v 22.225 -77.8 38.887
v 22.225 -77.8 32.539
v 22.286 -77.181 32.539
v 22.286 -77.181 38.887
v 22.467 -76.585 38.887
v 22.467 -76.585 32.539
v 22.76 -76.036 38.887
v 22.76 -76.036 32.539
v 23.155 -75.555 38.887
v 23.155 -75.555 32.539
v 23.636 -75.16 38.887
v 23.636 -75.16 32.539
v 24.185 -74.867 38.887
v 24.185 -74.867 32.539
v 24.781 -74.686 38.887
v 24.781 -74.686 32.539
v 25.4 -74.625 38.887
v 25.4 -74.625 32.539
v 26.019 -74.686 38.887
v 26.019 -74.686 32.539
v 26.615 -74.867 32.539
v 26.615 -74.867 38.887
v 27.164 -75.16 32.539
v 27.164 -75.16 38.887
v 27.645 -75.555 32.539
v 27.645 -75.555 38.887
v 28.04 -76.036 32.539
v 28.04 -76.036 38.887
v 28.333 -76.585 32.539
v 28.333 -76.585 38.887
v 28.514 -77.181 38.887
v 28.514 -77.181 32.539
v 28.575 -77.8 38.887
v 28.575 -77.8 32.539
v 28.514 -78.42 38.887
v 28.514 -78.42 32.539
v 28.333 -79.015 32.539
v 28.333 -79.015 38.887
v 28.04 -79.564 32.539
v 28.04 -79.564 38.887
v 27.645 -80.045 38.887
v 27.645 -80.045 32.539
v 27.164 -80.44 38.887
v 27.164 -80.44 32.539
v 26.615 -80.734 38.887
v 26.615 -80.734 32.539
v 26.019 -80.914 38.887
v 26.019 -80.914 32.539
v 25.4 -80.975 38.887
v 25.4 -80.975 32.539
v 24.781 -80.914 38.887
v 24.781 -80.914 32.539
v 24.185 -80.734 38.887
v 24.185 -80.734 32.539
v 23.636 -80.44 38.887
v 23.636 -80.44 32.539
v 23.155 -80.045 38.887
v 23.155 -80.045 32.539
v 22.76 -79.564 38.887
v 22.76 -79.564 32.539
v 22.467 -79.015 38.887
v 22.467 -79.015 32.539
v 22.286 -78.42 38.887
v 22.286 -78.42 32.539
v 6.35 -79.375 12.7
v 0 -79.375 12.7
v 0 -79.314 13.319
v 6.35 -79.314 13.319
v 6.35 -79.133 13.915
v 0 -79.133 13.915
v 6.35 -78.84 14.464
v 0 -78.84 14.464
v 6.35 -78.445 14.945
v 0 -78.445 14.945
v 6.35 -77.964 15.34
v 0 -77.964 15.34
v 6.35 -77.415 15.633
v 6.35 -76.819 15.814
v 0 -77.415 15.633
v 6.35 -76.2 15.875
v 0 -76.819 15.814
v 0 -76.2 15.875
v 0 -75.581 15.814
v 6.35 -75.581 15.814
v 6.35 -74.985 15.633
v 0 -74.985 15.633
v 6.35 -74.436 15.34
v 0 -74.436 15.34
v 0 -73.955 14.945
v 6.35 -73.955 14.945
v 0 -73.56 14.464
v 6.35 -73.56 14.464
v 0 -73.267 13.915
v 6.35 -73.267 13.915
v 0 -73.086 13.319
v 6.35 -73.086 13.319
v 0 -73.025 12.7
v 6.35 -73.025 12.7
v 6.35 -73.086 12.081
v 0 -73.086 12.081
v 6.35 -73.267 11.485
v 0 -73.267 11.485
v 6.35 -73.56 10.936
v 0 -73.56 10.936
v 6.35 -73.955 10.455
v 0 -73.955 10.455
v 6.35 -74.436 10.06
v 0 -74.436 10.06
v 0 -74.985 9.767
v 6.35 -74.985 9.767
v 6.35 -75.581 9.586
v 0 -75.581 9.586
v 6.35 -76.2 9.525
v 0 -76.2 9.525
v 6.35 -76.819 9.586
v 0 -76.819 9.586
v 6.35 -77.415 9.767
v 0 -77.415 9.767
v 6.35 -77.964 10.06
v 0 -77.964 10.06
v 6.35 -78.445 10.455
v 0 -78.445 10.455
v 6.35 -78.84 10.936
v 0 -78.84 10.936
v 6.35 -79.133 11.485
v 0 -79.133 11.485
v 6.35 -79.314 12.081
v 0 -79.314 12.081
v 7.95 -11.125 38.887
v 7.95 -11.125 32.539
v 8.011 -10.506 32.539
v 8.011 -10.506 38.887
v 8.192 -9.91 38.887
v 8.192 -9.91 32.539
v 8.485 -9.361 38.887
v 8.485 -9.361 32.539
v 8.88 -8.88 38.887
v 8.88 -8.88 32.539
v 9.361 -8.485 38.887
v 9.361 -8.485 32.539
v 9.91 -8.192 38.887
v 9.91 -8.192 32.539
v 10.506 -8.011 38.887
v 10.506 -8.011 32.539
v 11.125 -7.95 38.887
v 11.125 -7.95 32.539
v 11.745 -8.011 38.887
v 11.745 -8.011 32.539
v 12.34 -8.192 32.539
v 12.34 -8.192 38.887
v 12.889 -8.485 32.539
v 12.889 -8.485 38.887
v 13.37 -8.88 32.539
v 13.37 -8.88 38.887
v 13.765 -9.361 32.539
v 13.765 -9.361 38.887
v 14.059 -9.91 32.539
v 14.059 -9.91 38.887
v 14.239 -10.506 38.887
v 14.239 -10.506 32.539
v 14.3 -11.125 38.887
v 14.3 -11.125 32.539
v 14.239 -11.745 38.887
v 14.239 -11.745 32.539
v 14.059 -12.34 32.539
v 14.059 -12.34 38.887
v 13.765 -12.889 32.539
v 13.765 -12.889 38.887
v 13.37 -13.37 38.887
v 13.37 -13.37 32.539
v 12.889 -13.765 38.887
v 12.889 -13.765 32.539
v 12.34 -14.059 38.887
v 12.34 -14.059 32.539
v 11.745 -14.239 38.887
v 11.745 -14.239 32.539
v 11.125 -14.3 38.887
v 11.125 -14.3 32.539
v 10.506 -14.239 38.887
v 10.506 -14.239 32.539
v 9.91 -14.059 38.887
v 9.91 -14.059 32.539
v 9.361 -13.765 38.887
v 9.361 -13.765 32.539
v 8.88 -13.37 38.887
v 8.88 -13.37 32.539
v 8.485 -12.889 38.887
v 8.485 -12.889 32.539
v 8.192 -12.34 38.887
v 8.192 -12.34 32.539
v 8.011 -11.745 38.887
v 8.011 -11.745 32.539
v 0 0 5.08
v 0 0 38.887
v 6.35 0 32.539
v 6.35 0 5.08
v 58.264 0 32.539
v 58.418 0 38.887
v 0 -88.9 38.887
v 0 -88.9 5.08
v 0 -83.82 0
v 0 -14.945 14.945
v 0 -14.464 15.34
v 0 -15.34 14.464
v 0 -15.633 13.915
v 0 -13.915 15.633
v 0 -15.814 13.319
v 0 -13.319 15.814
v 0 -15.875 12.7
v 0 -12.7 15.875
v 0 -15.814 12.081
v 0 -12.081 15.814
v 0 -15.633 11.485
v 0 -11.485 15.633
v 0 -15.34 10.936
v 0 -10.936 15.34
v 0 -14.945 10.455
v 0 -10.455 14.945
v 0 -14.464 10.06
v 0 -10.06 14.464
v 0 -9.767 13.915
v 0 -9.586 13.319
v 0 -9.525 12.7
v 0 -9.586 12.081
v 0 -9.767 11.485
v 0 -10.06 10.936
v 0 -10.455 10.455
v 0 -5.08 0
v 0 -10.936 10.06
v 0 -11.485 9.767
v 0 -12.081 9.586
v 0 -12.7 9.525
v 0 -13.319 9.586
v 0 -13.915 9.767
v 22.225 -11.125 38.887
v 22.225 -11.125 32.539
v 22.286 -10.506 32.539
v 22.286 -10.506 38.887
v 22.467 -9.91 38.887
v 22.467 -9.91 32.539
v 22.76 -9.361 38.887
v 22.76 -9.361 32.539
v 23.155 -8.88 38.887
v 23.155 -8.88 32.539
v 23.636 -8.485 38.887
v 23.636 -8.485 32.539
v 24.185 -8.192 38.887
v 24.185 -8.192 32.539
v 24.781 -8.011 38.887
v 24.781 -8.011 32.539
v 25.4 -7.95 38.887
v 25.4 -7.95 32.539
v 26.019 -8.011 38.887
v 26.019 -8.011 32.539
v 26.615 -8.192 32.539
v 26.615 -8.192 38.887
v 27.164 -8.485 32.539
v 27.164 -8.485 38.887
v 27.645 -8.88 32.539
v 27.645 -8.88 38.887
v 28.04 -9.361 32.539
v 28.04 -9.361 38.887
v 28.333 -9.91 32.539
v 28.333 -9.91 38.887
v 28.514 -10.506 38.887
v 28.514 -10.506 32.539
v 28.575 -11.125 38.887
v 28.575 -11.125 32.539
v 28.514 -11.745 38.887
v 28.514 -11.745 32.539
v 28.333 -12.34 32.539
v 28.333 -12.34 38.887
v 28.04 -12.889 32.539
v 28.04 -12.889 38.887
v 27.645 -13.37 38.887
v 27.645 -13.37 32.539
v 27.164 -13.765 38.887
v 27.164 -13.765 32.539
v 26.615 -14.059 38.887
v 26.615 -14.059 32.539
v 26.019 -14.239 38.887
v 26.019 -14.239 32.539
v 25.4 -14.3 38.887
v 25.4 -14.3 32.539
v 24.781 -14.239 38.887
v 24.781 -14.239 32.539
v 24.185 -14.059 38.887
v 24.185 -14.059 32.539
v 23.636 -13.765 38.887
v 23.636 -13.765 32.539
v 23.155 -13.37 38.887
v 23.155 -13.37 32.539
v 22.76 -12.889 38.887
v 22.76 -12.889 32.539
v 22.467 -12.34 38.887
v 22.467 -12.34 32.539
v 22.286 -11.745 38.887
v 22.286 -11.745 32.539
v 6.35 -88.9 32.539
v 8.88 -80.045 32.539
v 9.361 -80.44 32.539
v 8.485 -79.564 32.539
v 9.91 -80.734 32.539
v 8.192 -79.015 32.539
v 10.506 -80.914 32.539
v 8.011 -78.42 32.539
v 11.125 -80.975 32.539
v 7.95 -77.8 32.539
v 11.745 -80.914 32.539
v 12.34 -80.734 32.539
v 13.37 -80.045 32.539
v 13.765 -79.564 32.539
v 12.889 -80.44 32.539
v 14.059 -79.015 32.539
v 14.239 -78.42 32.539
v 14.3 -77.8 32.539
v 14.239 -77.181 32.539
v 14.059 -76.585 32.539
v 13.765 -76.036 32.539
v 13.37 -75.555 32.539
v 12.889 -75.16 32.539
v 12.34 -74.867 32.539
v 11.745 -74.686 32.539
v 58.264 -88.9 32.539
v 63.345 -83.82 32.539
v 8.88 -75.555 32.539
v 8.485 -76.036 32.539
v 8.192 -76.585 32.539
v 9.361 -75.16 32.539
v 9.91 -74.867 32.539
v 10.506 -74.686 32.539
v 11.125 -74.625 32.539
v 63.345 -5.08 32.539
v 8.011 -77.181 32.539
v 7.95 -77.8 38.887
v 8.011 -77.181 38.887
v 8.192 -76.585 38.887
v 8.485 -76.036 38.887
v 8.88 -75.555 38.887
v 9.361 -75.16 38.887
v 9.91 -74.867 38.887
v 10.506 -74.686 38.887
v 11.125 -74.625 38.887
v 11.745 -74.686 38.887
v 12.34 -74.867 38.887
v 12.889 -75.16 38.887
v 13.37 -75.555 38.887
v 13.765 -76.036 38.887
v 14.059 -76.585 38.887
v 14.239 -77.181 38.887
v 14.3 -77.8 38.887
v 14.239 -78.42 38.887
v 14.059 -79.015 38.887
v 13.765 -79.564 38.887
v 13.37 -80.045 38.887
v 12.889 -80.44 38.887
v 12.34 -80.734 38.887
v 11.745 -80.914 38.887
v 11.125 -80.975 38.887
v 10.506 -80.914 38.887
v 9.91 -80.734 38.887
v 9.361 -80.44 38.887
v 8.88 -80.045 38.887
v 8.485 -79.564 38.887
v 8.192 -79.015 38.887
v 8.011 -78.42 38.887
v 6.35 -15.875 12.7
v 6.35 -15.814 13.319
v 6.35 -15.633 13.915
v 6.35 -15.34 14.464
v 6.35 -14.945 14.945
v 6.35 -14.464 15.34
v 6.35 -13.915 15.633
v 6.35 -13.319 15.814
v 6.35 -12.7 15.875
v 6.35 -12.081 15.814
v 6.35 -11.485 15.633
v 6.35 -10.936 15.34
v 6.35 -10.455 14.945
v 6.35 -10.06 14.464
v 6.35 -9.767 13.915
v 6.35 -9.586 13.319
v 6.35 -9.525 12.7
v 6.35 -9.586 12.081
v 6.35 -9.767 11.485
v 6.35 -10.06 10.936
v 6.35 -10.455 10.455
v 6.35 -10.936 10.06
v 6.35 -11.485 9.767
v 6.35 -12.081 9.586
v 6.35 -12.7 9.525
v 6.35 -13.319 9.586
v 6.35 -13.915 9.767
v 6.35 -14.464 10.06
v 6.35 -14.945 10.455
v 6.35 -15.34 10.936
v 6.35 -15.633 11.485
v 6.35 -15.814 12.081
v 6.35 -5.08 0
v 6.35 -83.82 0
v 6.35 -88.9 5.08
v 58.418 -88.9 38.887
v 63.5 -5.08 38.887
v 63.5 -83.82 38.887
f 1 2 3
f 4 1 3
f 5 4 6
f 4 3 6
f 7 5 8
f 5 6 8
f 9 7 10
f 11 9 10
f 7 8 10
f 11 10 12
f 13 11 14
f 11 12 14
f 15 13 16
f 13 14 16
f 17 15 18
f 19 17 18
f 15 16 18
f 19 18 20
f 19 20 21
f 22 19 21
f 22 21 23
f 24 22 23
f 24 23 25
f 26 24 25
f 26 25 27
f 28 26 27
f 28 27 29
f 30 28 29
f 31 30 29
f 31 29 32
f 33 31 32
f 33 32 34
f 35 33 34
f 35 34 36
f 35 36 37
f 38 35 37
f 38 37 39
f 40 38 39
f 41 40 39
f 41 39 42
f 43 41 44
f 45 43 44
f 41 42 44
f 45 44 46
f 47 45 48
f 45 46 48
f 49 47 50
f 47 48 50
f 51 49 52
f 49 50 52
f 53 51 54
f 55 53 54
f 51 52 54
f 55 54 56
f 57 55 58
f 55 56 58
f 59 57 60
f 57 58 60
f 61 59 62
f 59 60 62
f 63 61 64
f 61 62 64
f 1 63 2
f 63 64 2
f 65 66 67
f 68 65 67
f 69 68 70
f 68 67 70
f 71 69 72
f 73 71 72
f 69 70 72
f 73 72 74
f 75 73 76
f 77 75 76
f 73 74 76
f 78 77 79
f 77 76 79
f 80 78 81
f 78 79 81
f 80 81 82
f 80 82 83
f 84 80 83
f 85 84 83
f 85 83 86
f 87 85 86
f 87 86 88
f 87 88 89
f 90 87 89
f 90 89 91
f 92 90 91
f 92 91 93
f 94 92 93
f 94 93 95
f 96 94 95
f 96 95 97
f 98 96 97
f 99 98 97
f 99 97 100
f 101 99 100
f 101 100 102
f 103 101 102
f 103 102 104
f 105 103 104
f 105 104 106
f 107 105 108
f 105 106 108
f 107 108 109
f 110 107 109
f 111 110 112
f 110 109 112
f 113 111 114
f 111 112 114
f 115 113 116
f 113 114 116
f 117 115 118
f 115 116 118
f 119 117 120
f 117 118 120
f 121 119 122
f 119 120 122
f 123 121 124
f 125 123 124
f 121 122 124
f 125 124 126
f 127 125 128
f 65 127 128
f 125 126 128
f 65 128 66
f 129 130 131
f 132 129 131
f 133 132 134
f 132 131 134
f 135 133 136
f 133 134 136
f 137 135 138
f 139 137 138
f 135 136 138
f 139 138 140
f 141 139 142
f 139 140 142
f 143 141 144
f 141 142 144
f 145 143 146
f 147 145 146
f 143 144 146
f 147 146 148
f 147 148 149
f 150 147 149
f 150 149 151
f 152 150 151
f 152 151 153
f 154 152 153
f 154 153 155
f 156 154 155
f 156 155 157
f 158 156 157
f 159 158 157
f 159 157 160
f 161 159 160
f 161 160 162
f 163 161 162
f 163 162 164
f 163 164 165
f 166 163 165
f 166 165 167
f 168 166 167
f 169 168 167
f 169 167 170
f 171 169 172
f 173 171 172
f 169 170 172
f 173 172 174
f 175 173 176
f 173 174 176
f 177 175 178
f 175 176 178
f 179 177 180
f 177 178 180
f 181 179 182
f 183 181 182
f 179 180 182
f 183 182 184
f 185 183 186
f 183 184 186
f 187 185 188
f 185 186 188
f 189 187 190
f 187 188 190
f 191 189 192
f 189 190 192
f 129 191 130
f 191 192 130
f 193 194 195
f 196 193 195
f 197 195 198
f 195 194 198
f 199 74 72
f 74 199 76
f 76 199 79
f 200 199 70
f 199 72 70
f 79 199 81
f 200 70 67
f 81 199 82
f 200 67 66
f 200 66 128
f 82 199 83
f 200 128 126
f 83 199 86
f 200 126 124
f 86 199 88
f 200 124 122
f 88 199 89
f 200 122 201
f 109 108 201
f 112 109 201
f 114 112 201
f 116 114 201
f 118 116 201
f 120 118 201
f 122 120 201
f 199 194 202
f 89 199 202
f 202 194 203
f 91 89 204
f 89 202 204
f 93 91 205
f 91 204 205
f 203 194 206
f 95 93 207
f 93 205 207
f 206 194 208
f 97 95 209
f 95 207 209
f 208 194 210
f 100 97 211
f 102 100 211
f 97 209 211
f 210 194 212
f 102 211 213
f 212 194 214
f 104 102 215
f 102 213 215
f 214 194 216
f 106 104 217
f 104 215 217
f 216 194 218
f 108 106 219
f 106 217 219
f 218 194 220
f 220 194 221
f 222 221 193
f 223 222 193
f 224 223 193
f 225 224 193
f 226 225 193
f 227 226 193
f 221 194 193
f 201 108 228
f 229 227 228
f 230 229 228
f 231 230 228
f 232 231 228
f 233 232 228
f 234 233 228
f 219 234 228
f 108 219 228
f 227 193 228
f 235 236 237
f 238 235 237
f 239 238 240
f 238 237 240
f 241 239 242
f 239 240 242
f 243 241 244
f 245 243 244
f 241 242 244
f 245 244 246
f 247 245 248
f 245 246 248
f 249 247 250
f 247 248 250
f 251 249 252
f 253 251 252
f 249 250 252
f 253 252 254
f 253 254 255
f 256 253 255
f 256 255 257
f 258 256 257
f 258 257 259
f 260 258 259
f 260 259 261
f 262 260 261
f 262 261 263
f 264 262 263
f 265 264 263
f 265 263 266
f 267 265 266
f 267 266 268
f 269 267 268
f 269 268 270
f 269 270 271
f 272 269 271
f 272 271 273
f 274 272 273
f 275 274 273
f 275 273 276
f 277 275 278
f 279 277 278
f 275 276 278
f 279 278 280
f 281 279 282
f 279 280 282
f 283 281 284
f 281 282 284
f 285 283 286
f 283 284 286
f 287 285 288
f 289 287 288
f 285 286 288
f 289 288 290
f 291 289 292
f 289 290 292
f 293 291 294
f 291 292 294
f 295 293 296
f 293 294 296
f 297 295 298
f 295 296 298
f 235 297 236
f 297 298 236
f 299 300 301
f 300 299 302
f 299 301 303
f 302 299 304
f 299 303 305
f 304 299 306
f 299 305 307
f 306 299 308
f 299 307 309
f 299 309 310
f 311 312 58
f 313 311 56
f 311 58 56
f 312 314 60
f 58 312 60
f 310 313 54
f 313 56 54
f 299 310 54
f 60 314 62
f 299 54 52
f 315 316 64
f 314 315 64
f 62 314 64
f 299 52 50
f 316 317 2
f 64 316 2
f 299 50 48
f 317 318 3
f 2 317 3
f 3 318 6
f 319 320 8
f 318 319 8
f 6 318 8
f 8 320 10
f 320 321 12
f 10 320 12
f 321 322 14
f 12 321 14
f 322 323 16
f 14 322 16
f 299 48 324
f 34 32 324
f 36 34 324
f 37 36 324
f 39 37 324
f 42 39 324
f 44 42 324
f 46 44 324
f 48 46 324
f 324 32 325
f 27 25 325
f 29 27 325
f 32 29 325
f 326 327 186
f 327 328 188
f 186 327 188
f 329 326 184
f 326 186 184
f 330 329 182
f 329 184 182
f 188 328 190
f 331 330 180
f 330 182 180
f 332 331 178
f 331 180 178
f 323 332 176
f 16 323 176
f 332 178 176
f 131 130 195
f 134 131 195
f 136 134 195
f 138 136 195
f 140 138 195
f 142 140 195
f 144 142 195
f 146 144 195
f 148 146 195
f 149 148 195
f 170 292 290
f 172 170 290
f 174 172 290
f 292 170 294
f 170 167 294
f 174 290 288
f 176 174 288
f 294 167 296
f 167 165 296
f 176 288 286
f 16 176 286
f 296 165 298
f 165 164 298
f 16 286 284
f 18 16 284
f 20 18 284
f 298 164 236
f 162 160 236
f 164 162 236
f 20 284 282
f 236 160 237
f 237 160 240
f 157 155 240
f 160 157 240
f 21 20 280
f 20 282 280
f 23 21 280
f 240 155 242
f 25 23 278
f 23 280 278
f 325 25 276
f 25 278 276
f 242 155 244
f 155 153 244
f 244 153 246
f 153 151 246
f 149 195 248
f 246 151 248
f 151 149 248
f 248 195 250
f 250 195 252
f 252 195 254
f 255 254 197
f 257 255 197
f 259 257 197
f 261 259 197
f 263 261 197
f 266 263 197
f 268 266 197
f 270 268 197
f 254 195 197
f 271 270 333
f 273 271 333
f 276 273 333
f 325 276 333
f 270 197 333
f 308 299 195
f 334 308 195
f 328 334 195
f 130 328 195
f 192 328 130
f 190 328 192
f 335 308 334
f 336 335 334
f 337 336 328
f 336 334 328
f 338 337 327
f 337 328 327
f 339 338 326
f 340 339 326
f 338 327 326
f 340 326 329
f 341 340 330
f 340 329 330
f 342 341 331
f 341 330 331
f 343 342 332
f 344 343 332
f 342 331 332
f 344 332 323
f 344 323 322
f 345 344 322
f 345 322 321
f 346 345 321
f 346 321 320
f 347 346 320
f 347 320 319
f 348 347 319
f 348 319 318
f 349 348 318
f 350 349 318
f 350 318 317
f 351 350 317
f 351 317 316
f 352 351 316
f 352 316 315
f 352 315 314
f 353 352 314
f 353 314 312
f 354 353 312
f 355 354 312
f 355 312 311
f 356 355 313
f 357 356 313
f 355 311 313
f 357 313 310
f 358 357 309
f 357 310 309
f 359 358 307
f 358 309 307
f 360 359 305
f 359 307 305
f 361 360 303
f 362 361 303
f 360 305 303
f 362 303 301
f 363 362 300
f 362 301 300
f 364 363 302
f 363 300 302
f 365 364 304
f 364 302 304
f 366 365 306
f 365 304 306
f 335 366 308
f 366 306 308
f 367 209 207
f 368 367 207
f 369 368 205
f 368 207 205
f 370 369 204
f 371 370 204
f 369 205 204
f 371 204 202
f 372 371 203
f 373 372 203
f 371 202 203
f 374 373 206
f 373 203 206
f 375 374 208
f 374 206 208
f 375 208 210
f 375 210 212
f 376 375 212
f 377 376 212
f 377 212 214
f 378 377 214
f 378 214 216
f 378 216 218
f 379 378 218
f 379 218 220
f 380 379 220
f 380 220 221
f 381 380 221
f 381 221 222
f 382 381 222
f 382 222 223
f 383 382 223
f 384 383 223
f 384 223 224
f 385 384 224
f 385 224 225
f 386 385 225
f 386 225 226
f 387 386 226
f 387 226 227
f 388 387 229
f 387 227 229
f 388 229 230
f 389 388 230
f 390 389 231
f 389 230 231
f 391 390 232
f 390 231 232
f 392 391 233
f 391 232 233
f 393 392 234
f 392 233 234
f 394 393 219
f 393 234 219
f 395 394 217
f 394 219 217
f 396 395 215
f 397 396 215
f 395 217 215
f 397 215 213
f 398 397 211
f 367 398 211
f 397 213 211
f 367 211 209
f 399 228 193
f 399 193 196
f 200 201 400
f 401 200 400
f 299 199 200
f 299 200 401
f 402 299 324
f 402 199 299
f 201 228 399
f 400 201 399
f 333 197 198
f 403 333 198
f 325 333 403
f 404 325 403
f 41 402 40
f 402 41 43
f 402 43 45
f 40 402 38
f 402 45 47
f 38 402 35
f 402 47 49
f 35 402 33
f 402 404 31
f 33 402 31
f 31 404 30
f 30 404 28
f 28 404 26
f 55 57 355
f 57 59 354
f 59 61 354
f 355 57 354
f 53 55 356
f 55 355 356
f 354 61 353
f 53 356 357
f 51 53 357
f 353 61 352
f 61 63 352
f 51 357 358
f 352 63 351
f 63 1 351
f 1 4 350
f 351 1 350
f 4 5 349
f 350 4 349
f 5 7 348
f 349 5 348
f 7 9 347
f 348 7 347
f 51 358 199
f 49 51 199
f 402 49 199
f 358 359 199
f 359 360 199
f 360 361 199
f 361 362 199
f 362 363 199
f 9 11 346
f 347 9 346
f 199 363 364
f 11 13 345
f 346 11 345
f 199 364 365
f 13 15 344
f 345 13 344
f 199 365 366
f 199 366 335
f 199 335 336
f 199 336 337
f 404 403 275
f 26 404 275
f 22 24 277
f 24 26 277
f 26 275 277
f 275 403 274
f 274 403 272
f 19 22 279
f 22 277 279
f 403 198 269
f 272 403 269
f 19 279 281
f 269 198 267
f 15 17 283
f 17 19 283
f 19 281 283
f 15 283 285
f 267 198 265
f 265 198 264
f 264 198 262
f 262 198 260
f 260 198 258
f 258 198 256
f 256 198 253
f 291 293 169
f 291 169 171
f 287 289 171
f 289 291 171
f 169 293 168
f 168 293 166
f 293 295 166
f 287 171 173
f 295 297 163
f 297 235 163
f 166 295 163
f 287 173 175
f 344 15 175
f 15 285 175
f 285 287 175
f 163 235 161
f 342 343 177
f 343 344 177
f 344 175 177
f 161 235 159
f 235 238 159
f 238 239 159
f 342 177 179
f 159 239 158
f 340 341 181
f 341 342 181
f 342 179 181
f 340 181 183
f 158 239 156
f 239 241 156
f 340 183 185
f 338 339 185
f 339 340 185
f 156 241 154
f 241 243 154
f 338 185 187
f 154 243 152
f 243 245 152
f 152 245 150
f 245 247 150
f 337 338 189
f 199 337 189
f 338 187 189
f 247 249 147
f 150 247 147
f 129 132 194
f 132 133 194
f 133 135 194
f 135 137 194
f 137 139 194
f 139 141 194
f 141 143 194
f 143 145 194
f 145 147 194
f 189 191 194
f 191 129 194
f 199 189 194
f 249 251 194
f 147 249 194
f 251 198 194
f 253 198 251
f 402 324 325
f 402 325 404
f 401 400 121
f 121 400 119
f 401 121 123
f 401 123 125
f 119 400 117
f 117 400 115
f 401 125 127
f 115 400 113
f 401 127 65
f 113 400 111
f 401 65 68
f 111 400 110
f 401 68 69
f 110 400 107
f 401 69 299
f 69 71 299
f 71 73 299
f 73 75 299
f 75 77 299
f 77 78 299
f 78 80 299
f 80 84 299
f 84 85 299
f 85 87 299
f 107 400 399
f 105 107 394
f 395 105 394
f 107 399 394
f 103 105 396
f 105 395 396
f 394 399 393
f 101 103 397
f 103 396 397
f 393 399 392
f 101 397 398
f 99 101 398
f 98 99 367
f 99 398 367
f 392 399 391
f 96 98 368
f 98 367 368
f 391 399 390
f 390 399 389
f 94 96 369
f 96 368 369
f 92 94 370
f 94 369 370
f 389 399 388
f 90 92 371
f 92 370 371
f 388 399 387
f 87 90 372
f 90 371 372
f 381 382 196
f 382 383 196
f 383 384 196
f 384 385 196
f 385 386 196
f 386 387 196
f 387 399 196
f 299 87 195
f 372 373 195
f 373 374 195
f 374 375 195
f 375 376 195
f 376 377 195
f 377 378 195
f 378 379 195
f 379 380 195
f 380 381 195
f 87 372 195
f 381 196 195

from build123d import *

# Parameters (mm, degrees)
F1_DEPTH = 88.9
F3_D     = 6.35
F4_SIZE  = 5.08
F6_D     = 6.35


with BuildPart() as f1:
    # F0 (on Front) → F1 (new body)
    with BuildSketch(Plane.XZ):
        Polygon((0, 38.8874), (0, 0), (6.35, 0), (6.35, 32.539288), (63.345166, 32.539288), (63.5, 38.8874), align=None)
    extrude(amount=F1_DEPTH)

    # F3 (through all)
    with Locations(Plane.YZ.offset(6.35)):
        with Locations((-76.2, 12.7), (-12.7, 12.7)):
            Hole(F3_D / 2)

    # F4
    f4_edges = [f1.edges().sort_by_distance(p)[0] for p in [
        (63.422583, 0, 35.713344),
        (63.422583, -88.9, 35.713344),
        (3.175, 0, 0),
        (3.175, -88.9, 0),
    ]]
    chamfer(f4_edges, length=F4_SIZE)

    # F6 (through all)
    with Locations(Plane.XY.offset(38.8874)):
        with Locations((11.1252, -11.1252), (25.4, -11.1252), (25.4, -77.8002), (11.1252, -77.8002)):
            Hole(F6_D / 2)


solid = f1.part
